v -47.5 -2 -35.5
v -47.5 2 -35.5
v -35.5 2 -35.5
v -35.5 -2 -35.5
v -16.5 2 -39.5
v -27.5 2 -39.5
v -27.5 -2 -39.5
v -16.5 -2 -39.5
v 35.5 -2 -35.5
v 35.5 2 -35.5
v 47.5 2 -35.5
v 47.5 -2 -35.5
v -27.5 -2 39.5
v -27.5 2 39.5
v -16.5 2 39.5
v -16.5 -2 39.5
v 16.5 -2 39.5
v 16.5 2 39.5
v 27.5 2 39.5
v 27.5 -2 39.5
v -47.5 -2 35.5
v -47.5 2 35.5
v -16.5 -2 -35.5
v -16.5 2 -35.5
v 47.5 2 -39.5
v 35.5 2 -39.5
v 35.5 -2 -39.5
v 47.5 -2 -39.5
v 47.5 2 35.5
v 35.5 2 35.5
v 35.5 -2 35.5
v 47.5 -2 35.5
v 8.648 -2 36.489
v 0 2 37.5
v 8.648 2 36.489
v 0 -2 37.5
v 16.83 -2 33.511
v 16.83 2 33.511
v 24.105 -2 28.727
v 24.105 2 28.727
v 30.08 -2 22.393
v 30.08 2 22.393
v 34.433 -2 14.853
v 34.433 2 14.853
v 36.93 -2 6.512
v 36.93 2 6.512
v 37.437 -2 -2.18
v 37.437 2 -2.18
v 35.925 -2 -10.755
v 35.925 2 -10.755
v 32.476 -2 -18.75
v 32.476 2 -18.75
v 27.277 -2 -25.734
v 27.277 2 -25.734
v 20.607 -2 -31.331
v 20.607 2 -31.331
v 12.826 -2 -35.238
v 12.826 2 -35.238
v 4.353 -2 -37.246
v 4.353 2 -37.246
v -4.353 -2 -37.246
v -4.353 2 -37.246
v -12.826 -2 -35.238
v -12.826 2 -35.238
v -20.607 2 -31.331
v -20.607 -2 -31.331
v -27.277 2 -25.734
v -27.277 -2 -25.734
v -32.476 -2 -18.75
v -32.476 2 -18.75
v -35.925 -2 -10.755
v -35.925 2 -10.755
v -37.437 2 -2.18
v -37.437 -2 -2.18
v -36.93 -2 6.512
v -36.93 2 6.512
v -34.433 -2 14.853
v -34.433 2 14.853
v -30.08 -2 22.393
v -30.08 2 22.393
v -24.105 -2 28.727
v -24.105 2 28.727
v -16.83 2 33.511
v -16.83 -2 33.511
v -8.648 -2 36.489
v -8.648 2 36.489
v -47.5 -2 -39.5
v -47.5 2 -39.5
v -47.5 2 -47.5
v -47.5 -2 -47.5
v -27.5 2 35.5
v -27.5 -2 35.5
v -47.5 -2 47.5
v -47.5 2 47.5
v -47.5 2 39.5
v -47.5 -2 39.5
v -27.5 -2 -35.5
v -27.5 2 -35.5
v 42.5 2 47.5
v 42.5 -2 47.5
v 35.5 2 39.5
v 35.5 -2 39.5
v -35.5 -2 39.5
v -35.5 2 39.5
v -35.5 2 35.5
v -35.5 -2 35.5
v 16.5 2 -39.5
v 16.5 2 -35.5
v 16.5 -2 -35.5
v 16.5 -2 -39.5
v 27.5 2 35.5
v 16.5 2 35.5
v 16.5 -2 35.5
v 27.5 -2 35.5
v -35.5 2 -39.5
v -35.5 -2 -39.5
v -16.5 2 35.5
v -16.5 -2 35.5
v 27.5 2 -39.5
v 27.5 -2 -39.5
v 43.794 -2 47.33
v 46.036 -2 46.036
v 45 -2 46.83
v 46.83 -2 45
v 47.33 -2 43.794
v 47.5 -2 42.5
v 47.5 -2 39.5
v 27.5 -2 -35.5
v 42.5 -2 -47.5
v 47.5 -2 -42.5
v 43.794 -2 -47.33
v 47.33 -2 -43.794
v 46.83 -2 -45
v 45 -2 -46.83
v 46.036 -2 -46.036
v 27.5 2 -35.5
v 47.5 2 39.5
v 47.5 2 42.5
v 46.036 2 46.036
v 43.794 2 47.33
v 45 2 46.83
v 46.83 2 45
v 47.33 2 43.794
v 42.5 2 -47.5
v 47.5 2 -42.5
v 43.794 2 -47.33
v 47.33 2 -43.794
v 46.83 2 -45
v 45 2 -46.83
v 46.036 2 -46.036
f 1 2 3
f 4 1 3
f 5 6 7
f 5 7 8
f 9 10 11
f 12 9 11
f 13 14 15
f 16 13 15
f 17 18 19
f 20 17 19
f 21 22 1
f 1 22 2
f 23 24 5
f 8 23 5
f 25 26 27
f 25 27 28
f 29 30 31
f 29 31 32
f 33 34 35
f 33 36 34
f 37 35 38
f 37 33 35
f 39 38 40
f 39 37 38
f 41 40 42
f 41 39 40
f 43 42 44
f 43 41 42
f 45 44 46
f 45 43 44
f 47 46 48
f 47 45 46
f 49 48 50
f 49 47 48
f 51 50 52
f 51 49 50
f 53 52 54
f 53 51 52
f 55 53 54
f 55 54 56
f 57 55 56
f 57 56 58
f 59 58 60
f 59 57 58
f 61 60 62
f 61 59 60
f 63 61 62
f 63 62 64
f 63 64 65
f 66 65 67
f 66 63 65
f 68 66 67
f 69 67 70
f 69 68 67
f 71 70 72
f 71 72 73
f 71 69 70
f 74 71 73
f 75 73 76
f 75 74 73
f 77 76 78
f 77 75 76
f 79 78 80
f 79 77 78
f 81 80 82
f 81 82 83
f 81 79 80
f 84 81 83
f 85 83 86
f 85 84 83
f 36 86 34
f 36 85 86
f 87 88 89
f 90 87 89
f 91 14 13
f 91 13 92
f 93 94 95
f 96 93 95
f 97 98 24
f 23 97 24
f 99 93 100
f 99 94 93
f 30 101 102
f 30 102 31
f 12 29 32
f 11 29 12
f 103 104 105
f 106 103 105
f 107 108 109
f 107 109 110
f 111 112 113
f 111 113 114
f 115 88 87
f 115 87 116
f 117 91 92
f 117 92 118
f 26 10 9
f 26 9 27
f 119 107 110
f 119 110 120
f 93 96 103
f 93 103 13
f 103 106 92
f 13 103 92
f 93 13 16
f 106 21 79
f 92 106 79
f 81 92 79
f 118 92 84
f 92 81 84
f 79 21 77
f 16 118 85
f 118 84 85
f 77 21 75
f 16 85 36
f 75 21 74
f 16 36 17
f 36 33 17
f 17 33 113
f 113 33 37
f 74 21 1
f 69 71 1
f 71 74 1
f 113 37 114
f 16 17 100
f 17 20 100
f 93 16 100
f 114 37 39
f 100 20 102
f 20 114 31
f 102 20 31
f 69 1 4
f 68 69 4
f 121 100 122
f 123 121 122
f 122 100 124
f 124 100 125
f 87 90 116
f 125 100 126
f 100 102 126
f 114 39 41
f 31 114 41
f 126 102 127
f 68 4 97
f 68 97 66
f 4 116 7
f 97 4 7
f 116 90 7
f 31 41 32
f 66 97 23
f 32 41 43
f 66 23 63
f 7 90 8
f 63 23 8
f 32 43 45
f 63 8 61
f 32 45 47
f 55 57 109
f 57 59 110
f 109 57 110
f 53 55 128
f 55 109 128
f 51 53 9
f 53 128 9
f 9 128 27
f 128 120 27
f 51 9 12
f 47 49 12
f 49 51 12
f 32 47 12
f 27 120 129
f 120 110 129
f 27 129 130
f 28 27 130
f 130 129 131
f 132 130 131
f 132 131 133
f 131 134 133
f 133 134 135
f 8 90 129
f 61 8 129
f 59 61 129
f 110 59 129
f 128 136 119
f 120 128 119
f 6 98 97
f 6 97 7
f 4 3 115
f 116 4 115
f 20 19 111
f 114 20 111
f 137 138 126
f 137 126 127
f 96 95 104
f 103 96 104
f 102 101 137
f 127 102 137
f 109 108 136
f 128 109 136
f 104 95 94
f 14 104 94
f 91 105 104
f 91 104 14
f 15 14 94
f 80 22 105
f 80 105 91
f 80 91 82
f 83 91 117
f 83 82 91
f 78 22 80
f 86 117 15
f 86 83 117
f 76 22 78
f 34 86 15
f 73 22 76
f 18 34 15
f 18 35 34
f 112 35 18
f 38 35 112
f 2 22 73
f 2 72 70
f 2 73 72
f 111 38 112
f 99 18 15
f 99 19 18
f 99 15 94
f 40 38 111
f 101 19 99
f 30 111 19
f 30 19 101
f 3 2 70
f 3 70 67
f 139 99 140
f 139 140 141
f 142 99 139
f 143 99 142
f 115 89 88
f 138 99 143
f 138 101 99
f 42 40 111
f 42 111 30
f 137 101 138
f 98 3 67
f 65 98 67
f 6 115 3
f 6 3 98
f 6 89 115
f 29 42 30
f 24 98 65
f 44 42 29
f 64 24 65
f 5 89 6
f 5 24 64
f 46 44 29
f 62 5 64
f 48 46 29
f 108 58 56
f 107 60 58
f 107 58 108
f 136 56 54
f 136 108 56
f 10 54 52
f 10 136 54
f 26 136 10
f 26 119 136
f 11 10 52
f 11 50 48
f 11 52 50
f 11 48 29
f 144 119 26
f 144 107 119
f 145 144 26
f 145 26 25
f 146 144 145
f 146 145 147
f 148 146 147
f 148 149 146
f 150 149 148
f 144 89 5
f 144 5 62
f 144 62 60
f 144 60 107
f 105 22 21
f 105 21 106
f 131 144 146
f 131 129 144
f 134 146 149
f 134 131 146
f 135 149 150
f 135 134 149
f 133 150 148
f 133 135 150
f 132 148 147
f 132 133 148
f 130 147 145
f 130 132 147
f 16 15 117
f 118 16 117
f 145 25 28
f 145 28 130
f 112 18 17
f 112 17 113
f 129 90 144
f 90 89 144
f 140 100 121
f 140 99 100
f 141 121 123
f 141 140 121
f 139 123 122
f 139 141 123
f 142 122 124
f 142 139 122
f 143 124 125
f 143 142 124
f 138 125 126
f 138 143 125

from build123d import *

# Parameters (mm, degrees)
SKETCH1_W           = 95
SKETCH1_H           = 95
SKETCH1_R           = 37.5
BOSS_EXTRUDE1_DEPTH = 2
SKETCH3_W           = 12
SKETCH3_H           = 4
SKETCH3_W_2         = 11
CUT_EXTRUDE5_DEPTH  = 68.294130502
FILLET1_R           = 5


with BuildPart() as part:
    # Sketch1 → Boss-Extrude1 (new, symmetric)
    with BuildSketch(Plane(origin=(0, 0, 0), x_dir=(1, 0, 0), z_dir=(0, 1, 0))):
        Rectangle(SKETCH1_W, SKETCH1_H)
        Circle(SKETCH1_R, mode=Mode.SUBTRACT)
    extrude(amount=BOSS_EXTRUDE1_DEPTH, both=True)

    # Sketch3 → Cut-Extrude5 (cut, through all)
    with BuildSketch(Plane(origin=(0, 2, 0), x_dir=(1, 0, 0), z_dir=(0, 1, 0))):
        with Locations((-41.5, -37.5)):
            Rectangle(SKETCH3_W, SKETCH3_H)
        with Locations((-41.5, 37.5)):
            Rectangle(SKETCH3_W, SKETCH3_H)
        with Locations((22, 37.5)):
            Rectangle(SKETCH3_W_2, SKETCH3_H)
        with Locations((41.5, -37.5)):
            Rectangle(SKETCH3_W, SKETCH3_H)
        with Locations((41.5, 37.5)):
            Rectangle(SKETCH3_W, SKETCH3_H)
        with Locations((22, -37.5)):
            Rectangle(SKETCH3_W_2, SKETCH3_H)
        with Locations((-22, -37.5)):
            Rectangle(SKETCH3_W_2, SKETCH3_H)
        with Locations((-22, 37.5)):
            Rectangle(SKETCH3_W_2, SKETCH3_H)
    extrude(amount=-CUT_EXTRUDE5_DEPTH, mode=Mode.SUBTRACT)

    # Fillet1
    fillet1_edges = [part.edges().sort_by_distance(p)[0] for p in [
        (47.5, 0, -47.5),
        (47.5, 0, 47.5),
    ]]
    fillet(fillet1_edges, radius=FILLET1_R)


solid = part.part
